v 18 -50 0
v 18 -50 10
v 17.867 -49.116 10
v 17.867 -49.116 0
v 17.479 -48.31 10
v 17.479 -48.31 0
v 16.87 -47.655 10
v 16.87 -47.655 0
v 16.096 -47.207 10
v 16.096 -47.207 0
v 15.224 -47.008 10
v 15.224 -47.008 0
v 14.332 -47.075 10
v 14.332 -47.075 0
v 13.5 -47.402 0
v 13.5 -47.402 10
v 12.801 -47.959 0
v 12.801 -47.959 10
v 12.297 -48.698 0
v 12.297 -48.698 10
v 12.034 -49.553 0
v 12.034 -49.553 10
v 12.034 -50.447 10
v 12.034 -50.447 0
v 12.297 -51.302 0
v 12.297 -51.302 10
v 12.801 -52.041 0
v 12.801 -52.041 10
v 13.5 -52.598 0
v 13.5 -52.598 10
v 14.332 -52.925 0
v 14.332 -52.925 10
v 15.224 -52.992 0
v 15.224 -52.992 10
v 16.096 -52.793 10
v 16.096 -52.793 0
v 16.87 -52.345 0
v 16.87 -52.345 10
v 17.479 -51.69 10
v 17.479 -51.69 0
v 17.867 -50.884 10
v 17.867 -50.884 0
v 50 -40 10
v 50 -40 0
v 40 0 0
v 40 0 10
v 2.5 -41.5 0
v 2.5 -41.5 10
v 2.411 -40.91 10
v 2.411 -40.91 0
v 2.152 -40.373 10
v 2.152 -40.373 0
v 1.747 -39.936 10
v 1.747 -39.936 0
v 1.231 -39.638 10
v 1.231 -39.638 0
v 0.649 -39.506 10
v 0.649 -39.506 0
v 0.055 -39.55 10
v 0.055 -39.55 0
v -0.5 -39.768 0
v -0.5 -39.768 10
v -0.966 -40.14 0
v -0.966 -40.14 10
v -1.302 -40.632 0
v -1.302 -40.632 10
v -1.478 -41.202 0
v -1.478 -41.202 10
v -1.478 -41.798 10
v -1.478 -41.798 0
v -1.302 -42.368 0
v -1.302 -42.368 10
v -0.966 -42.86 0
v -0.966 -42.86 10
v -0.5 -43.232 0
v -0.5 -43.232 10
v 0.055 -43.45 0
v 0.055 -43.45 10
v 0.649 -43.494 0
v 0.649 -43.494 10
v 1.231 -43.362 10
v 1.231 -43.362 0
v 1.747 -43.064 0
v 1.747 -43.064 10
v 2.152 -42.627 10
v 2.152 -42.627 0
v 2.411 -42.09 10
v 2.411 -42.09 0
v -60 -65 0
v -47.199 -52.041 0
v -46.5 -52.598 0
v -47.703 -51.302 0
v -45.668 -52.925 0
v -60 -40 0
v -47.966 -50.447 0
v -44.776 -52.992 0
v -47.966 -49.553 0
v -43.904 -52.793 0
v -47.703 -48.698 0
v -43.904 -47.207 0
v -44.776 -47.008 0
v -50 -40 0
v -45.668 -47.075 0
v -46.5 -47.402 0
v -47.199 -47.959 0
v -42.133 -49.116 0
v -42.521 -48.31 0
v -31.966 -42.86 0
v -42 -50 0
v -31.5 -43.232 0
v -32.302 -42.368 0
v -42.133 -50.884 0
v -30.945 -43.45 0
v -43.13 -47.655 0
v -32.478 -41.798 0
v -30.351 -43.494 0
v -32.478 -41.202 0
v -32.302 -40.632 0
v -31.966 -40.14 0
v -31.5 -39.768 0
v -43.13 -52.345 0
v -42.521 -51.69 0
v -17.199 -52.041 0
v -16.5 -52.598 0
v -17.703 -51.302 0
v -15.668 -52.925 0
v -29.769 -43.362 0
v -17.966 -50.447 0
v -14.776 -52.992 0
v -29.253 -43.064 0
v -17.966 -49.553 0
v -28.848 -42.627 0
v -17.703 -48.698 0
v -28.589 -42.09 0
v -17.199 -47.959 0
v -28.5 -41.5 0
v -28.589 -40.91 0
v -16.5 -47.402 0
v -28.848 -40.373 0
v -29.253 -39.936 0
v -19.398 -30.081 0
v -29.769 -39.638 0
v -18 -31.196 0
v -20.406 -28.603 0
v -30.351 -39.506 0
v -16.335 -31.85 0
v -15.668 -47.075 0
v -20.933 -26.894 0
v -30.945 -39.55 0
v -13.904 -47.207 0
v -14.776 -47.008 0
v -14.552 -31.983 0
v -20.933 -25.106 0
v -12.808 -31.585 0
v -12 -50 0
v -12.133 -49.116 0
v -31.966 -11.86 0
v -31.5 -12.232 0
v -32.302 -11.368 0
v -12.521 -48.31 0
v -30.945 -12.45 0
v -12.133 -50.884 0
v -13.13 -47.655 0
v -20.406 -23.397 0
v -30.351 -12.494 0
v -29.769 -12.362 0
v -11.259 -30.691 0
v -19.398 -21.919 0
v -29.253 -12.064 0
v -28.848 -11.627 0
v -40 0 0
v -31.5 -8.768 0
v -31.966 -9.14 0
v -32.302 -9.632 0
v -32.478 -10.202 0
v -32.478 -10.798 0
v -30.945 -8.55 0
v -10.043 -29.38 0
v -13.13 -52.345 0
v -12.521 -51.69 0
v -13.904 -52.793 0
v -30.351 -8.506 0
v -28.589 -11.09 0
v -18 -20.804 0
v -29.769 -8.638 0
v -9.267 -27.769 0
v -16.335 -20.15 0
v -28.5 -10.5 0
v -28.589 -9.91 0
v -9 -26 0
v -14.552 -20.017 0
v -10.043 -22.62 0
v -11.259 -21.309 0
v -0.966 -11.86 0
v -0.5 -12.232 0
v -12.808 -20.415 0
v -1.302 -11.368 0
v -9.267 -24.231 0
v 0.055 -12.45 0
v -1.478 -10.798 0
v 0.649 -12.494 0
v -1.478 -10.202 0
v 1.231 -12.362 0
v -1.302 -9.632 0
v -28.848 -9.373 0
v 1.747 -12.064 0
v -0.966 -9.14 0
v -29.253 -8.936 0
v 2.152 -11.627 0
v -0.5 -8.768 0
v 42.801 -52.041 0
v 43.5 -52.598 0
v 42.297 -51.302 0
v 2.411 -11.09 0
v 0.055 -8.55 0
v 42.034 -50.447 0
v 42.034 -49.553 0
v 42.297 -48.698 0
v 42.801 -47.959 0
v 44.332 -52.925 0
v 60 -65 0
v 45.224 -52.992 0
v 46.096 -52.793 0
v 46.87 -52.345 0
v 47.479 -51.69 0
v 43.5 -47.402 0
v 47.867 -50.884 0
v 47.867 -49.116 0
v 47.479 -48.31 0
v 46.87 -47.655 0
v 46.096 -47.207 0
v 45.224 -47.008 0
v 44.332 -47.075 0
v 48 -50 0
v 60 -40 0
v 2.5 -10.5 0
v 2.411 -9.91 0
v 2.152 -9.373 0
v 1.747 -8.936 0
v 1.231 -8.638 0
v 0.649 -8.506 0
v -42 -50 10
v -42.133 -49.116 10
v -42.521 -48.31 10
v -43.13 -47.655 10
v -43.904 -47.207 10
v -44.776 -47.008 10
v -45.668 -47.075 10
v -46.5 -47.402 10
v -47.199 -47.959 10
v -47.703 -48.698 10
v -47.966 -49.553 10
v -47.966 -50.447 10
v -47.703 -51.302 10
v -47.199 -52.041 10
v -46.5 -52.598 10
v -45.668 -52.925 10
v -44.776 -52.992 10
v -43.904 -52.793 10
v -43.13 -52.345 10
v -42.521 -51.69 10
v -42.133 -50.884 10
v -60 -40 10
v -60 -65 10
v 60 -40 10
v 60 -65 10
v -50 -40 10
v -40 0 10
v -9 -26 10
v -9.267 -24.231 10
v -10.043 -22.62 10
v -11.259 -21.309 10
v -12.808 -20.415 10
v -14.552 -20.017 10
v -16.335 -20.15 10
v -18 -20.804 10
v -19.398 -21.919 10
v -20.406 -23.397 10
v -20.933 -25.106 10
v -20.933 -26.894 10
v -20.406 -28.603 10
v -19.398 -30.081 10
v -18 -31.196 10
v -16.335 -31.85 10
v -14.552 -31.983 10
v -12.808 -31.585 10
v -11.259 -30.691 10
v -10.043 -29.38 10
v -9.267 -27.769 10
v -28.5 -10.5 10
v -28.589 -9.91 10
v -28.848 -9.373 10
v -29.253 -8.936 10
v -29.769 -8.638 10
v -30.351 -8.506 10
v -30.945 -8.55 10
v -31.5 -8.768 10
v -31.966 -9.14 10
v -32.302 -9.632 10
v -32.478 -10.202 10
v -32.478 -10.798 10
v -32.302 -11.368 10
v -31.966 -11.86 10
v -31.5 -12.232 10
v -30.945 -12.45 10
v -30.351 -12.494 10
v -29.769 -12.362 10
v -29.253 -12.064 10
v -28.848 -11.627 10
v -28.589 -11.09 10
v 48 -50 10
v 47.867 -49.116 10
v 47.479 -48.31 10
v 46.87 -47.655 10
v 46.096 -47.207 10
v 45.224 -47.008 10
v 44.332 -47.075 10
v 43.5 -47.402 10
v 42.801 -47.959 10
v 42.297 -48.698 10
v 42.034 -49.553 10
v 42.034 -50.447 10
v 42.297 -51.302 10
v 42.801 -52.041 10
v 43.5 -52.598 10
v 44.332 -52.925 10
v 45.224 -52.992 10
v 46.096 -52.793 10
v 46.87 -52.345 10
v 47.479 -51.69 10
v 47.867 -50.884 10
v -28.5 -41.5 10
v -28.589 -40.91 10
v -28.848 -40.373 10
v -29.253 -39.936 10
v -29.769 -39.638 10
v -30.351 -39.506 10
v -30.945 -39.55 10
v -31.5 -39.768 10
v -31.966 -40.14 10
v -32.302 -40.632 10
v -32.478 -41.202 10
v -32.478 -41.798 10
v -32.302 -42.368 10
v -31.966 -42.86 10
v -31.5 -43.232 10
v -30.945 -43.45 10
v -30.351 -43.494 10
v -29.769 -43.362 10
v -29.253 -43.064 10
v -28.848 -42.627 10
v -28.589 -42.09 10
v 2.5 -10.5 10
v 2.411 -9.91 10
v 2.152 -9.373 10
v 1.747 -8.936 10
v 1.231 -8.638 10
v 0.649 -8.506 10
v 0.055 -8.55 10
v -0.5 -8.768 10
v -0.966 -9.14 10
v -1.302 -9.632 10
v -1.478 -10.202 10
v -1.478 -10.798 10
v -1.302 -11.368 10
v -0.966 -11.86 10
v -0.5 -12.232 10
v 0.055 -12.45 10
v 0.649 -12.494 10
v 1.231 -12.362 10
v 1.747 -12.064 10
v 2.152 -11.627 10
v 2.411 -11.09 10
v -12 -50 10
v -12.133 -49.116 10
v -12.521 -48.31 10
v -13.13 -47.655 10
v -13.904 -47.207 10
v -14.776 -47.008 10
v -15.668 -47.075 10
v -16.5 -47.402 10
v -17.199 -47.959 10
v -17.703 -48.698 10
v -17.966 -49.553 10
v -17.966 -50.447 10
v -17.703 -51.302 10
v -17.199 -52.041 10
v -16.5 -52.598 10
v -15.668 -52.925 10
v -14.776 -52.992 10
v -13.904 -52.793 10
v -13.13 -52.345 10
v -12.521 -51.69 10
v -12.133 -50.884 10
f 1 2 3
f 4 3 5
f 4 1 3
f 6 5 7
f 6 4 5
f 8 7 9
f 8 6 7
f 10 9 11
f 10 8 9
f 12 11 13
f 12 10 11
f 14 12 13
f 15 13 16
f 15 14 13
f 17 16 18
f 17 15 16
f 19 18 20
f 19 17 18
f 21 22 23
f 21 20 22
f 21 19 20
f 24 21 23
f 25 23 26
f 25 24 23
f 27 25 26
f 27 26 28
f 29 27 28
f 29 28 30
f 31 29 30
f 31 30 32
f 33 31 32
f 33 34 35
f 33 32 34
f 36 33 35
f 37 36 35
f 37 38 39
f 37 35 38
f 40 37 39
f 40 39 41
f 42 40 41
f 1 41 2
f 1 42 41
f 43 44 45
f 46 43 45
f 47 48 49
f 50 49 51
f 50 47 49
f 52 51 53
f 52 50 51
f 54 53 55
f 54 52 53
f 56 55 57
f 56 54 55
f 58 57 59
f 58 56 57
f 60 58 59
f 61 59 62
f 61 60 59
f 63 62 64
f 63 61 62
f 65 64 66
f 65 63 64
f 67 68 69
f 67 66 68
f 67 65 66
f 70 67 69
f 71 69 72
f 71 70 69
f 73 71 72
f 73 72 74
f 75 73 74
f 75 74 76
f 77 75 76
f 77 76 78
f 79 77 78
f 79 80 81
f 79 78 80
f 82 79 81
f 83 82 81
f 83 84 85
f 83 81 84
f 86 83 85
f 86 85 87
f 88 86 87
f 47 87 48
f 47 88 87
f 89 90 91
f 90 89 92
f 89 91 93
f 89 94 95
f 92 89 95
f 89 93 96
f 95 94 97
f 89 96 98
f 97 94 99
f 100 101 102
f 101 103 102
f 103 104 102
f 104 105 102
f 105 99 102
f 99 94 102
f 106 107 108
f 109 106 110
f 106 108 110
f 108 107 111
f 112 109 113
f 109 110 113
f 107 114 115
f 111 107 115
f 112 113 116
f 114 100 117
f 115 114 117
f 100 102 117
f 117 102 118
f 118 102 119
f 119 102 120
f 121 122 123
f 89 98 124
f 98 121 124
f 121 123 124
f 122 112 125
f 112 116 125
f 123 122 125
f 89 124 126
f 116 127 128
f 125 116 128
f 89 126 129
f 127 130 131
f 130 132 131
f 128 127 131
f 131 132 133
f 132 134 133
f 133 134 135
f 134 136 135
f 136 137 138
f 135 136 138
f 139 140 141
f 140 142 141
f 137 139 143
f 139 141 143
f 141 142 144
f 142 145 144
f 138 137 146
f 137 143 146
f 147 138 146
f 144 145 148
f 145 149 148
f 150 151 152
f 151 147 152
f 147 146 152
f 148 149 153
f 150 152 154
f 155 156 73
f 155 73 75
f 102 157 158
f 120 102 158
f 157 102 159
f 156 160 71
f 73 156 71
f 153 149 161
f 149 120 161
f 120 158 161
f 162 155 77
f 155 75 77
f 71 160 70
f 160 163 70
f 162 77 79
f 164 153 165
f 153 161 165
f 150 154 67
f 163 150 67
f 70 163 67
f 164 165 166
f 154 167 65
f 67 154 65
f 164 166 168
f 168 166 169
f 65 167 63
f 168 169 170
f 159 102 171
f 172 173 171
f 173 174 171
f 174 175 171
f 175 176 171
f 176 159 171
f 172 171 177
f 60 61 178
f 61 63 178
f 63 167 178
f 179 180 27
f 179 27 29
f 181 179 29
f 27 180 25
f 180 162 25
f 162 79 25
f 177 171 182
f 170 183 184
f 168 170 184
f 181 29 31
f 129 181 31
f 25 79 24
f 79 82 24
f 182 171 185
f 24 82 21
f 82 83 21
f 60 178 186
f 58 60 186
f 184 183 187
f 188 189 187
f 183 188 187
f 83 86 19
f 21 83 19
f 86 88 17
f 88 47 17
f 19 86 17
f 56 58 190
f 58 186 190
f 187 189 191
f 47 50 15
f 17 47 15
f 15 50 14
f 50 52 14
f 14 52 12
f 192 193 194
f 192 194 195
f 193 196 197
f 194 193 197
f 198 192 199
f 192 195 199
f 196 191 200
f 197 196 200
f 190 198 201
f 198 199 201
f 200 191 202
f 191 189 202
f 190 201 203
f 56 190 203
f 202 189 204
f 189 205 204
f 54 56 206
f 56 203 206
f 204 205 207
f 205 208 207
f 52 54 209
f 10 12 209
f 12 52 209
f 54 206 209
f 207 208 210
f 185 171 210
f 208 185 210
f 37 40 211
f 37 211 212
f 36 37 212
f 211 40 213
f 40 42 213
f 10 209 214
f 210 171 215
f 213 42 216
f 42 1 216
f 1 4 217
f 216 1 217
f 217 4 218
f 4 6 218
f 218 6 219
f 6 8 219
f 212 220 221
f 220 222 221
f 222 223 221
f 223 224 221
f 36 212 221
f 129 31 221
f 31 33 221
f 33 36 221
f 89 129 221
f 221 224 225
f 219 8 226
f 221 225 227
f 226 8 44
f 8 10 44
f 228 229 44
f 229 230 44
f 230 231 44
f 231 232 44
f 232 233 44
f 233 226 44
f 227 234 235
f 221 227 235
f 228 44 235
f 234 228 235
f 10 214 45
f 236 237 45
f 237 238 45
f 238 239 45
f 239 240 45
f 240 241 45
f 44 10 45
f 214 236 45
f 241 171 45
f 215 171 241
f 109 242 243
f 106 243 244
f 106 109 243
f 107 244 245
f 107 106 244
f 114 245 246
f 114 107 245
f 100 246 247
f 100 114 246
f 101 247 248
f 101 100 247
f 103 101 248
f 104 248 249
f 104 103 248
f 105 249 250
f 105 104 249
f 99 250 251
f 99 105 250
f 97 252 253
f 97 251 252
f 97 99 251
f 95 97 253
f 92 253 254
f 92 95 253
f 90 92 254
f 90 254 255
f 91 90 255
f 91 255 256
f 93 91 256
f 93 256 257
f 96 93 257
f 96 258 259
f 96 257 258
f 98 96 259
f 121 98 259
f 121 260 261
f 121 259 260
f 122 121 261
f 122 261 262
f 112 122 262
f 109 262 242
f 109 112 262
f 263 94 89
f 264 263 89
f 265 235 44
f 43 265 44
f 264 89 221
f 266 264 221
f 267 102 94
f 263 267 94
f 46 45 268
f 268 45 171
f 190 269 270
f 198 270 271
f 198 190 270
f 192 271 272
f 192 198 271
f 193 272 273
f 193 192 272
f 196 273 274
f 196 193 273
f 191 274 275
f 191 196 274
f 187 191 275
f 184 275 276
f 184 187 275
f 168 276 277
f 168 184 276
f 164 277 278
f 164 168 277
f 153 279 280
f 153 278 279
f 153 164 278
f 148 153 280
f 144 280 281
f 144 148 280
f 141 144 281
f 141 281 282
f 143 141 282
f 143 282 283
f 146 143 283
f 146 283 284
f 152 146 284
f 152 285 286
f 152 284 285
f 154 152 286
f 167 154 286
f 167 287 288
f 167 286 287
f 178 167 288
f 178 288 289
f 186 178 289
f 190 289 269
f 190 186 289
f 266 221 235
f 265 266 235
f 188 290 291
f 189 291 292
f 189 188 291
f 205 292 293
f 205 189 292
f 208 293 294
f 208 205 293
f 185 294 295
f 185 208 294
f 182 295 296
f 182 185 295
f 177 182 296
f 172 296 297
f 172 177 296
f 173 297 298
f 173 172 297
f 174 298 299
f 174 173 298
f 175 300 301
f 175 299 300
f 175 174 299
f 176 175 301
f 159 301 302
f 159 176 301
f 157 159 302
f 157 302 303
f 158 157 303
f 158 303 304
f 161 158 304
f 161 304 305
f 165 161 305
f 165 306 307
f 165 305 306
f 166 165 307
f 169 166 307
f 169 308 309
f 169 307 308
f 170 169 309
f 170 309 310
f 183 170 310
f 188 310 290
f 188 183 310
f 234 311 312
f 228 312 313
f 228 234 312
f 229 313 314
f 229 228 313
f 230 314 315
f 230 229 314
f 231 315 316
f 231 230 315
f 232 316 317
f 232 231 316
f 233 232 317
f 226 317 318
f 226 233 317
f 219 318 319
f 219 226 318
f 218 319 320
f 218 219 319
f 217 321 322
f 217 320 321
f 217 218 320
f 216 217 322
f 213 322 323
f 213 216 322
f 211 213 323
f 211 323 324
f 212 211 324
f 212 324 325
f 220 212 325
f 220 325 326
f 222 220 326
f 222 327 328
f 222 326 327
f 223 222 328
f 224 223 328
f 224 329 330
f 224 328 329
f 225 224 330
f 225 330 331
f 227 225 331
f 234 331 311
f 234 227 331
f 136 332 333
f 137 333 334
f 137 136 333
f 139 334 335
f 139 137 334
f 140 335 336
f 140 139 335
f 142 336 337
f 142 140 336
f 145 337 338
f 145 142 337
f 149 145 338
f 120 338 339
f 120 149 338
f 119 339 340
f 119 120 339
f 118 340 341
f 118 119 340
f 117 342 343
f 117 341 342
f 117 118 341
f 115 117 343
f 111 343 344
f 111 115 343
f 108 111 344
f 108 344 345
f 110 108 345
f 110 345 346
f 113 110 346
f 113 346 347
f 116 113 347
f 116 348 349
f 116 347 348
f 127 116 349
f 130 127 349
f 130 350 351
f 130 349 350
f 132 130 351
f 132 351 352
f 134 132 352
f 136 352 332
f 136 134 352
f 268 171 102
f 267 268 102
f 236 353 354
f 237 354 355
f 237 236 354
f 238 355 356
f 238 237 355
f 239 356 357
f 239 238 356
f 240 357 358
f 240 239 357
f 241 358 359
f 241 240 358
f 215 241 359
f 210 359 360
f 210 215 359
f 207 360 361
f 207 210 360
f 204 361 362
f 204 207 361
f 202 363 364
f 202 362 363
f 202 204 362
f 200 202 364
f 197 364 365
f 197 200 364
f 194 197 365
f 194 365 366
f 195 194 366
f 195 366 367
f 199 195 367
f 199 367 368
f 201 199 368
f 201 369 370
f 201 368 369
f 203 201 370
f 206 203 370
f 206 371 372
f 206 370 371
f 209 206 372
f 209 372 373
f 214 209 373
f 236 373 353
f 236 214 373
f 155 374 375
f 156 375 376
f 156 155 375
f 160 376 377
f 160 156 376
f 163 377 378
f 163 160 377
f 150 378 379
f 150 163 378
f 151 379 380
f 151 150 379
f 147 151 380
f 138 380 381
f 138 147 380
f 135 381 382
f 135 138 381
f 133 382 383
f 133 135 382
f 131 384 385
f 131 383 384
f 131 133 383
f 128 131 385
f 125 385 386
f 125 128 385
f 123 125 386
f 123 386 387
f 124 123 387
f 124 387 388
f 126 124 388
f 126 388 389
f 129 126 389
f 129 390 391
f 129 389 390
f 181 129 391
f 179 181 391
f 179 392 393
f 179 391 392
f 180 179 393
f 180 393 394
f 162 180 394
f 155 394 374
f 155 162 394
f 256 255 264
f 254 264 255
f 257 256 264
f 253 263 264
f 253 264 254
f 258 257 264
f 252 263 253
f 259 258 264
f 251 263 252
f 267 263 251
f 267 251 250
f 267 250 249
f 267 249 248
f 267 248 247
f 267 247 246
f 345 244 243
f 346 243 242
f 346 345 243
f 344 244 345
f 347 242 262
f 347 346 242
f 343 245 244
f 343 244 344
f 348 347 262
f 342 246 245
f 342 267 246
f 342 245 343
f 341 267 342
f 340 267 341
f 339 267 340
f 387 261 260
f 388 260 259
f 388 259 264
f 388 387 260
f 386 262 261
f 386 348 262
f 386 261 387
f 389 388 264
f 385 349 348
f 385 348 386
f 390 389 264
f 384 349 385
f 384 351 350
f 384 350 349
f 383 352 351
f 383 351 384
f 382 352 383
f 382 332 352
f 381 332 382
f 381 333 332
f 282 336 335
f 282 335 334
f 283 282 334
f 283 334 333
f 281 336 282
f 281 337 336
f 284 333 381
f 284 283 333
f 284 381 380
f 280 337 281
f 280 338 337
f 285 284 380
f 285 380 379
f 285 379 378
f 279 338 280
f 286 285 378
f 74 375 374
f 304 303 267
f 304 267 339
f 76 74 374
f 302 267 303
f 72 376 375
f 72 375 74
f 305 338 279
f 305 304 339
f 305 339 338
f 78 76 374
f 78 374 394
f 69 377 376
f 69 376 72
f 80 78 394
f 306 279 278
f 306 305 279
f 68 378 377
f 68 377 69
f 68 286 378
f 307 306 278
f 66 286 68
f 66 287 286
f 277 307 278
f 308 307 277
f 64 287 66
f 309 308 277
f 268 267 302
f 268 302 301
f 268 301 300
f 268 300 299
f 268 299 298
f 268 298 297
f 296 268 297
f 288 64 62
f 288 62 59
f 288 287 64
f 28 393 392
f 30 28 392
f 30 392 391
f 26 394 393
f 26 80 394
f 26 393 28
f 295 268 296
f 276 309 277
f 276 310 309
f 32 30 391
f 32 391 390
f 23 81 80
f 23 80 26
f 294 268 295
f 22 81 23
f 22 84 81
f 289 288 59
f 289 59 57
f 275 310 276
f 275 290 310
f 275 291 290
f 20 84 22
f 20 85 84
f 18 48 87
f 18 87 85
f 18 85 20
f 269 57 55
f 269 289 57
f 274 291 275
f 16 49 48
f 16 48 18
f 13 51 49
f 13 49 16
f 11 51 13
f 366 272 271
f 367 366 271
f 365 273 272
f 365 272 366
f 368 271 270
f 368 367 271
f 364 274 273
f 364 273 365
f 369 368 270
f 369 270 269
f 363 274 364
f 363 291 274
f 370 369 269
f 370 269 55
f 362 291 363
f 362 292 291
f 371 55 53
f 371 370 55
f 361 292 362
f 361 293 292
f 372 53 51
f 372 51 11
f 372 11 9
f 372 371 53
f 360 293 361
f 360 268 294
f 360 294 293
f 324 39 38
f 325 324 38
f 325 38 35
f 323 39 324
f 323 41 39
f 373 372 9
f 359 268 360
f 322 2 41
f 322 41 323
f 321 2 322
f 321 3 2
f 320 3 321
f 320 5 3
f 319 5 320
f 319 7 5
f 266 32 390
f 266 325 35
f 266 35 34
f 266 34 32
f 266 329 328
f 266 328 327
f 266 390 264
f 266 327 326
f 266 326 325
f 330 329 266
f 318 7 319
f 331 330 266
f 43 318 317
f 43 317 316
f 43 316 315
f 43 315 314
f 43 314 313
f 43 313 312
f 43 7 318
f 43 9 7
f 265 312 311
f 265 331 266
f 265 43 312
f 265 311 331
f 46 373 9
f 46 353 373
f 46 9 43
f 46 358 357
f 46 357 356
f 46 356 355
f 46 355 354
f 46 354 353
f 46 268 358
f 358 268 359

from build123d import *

# Parameters (mm, degrees)
F1_DEPTH = 10
F2_R     = 6
F2_R_2   = 2
F3_DEPTH = 25
F4_R     = 3
F5_DEPTH = 24.5


with BuildPart() as f1:
    # F0 (on Top) → F1 (new body)
    with BuildSketch(Plane.XY):
        Polygon((-60, -40), (-60, -65), (60, -65), (60, -40), (50, -40), (40, 0), (-40, 0), (-50, -40), align=None)
    extrude(amount=F1_DEPTH)

    # F2 (on Top) → F3 (cut)
    with BuildSketch(Plane.XY):
        with Locations((-15, -26)):
            Circle(F2_R)
        with Locations((-30.5, -10.5)):
            Circle(F2_R_2)
        with Locations((0.5, -10.5)):
            Circle(F2_R_2)
        with Locations((-30.5, -41.5)):
            Circle(F2_R_2)
        with Locations((0.5, -41.5)):
            Circle(F2_R_2)
    extrude(amount=F3_DEPTH, mode=Mode.SUBTRACT)

    # F4 (on Top) → F5 (cut)
    with BuildSketch(Plane.XY):
        with Locations((-45, -50)):
            Circle(F4_R)
        with Locations((-15, -50)):
            Circle(F4_R)
        with Locations((45, -50)):
            Circle(F4_R)
        with Locations((15, -50)):
            Circle(F4_R)
    extrude(amount=F5_DEPTH, mode=Mode.SUBTRACT)


solid = f1.part
